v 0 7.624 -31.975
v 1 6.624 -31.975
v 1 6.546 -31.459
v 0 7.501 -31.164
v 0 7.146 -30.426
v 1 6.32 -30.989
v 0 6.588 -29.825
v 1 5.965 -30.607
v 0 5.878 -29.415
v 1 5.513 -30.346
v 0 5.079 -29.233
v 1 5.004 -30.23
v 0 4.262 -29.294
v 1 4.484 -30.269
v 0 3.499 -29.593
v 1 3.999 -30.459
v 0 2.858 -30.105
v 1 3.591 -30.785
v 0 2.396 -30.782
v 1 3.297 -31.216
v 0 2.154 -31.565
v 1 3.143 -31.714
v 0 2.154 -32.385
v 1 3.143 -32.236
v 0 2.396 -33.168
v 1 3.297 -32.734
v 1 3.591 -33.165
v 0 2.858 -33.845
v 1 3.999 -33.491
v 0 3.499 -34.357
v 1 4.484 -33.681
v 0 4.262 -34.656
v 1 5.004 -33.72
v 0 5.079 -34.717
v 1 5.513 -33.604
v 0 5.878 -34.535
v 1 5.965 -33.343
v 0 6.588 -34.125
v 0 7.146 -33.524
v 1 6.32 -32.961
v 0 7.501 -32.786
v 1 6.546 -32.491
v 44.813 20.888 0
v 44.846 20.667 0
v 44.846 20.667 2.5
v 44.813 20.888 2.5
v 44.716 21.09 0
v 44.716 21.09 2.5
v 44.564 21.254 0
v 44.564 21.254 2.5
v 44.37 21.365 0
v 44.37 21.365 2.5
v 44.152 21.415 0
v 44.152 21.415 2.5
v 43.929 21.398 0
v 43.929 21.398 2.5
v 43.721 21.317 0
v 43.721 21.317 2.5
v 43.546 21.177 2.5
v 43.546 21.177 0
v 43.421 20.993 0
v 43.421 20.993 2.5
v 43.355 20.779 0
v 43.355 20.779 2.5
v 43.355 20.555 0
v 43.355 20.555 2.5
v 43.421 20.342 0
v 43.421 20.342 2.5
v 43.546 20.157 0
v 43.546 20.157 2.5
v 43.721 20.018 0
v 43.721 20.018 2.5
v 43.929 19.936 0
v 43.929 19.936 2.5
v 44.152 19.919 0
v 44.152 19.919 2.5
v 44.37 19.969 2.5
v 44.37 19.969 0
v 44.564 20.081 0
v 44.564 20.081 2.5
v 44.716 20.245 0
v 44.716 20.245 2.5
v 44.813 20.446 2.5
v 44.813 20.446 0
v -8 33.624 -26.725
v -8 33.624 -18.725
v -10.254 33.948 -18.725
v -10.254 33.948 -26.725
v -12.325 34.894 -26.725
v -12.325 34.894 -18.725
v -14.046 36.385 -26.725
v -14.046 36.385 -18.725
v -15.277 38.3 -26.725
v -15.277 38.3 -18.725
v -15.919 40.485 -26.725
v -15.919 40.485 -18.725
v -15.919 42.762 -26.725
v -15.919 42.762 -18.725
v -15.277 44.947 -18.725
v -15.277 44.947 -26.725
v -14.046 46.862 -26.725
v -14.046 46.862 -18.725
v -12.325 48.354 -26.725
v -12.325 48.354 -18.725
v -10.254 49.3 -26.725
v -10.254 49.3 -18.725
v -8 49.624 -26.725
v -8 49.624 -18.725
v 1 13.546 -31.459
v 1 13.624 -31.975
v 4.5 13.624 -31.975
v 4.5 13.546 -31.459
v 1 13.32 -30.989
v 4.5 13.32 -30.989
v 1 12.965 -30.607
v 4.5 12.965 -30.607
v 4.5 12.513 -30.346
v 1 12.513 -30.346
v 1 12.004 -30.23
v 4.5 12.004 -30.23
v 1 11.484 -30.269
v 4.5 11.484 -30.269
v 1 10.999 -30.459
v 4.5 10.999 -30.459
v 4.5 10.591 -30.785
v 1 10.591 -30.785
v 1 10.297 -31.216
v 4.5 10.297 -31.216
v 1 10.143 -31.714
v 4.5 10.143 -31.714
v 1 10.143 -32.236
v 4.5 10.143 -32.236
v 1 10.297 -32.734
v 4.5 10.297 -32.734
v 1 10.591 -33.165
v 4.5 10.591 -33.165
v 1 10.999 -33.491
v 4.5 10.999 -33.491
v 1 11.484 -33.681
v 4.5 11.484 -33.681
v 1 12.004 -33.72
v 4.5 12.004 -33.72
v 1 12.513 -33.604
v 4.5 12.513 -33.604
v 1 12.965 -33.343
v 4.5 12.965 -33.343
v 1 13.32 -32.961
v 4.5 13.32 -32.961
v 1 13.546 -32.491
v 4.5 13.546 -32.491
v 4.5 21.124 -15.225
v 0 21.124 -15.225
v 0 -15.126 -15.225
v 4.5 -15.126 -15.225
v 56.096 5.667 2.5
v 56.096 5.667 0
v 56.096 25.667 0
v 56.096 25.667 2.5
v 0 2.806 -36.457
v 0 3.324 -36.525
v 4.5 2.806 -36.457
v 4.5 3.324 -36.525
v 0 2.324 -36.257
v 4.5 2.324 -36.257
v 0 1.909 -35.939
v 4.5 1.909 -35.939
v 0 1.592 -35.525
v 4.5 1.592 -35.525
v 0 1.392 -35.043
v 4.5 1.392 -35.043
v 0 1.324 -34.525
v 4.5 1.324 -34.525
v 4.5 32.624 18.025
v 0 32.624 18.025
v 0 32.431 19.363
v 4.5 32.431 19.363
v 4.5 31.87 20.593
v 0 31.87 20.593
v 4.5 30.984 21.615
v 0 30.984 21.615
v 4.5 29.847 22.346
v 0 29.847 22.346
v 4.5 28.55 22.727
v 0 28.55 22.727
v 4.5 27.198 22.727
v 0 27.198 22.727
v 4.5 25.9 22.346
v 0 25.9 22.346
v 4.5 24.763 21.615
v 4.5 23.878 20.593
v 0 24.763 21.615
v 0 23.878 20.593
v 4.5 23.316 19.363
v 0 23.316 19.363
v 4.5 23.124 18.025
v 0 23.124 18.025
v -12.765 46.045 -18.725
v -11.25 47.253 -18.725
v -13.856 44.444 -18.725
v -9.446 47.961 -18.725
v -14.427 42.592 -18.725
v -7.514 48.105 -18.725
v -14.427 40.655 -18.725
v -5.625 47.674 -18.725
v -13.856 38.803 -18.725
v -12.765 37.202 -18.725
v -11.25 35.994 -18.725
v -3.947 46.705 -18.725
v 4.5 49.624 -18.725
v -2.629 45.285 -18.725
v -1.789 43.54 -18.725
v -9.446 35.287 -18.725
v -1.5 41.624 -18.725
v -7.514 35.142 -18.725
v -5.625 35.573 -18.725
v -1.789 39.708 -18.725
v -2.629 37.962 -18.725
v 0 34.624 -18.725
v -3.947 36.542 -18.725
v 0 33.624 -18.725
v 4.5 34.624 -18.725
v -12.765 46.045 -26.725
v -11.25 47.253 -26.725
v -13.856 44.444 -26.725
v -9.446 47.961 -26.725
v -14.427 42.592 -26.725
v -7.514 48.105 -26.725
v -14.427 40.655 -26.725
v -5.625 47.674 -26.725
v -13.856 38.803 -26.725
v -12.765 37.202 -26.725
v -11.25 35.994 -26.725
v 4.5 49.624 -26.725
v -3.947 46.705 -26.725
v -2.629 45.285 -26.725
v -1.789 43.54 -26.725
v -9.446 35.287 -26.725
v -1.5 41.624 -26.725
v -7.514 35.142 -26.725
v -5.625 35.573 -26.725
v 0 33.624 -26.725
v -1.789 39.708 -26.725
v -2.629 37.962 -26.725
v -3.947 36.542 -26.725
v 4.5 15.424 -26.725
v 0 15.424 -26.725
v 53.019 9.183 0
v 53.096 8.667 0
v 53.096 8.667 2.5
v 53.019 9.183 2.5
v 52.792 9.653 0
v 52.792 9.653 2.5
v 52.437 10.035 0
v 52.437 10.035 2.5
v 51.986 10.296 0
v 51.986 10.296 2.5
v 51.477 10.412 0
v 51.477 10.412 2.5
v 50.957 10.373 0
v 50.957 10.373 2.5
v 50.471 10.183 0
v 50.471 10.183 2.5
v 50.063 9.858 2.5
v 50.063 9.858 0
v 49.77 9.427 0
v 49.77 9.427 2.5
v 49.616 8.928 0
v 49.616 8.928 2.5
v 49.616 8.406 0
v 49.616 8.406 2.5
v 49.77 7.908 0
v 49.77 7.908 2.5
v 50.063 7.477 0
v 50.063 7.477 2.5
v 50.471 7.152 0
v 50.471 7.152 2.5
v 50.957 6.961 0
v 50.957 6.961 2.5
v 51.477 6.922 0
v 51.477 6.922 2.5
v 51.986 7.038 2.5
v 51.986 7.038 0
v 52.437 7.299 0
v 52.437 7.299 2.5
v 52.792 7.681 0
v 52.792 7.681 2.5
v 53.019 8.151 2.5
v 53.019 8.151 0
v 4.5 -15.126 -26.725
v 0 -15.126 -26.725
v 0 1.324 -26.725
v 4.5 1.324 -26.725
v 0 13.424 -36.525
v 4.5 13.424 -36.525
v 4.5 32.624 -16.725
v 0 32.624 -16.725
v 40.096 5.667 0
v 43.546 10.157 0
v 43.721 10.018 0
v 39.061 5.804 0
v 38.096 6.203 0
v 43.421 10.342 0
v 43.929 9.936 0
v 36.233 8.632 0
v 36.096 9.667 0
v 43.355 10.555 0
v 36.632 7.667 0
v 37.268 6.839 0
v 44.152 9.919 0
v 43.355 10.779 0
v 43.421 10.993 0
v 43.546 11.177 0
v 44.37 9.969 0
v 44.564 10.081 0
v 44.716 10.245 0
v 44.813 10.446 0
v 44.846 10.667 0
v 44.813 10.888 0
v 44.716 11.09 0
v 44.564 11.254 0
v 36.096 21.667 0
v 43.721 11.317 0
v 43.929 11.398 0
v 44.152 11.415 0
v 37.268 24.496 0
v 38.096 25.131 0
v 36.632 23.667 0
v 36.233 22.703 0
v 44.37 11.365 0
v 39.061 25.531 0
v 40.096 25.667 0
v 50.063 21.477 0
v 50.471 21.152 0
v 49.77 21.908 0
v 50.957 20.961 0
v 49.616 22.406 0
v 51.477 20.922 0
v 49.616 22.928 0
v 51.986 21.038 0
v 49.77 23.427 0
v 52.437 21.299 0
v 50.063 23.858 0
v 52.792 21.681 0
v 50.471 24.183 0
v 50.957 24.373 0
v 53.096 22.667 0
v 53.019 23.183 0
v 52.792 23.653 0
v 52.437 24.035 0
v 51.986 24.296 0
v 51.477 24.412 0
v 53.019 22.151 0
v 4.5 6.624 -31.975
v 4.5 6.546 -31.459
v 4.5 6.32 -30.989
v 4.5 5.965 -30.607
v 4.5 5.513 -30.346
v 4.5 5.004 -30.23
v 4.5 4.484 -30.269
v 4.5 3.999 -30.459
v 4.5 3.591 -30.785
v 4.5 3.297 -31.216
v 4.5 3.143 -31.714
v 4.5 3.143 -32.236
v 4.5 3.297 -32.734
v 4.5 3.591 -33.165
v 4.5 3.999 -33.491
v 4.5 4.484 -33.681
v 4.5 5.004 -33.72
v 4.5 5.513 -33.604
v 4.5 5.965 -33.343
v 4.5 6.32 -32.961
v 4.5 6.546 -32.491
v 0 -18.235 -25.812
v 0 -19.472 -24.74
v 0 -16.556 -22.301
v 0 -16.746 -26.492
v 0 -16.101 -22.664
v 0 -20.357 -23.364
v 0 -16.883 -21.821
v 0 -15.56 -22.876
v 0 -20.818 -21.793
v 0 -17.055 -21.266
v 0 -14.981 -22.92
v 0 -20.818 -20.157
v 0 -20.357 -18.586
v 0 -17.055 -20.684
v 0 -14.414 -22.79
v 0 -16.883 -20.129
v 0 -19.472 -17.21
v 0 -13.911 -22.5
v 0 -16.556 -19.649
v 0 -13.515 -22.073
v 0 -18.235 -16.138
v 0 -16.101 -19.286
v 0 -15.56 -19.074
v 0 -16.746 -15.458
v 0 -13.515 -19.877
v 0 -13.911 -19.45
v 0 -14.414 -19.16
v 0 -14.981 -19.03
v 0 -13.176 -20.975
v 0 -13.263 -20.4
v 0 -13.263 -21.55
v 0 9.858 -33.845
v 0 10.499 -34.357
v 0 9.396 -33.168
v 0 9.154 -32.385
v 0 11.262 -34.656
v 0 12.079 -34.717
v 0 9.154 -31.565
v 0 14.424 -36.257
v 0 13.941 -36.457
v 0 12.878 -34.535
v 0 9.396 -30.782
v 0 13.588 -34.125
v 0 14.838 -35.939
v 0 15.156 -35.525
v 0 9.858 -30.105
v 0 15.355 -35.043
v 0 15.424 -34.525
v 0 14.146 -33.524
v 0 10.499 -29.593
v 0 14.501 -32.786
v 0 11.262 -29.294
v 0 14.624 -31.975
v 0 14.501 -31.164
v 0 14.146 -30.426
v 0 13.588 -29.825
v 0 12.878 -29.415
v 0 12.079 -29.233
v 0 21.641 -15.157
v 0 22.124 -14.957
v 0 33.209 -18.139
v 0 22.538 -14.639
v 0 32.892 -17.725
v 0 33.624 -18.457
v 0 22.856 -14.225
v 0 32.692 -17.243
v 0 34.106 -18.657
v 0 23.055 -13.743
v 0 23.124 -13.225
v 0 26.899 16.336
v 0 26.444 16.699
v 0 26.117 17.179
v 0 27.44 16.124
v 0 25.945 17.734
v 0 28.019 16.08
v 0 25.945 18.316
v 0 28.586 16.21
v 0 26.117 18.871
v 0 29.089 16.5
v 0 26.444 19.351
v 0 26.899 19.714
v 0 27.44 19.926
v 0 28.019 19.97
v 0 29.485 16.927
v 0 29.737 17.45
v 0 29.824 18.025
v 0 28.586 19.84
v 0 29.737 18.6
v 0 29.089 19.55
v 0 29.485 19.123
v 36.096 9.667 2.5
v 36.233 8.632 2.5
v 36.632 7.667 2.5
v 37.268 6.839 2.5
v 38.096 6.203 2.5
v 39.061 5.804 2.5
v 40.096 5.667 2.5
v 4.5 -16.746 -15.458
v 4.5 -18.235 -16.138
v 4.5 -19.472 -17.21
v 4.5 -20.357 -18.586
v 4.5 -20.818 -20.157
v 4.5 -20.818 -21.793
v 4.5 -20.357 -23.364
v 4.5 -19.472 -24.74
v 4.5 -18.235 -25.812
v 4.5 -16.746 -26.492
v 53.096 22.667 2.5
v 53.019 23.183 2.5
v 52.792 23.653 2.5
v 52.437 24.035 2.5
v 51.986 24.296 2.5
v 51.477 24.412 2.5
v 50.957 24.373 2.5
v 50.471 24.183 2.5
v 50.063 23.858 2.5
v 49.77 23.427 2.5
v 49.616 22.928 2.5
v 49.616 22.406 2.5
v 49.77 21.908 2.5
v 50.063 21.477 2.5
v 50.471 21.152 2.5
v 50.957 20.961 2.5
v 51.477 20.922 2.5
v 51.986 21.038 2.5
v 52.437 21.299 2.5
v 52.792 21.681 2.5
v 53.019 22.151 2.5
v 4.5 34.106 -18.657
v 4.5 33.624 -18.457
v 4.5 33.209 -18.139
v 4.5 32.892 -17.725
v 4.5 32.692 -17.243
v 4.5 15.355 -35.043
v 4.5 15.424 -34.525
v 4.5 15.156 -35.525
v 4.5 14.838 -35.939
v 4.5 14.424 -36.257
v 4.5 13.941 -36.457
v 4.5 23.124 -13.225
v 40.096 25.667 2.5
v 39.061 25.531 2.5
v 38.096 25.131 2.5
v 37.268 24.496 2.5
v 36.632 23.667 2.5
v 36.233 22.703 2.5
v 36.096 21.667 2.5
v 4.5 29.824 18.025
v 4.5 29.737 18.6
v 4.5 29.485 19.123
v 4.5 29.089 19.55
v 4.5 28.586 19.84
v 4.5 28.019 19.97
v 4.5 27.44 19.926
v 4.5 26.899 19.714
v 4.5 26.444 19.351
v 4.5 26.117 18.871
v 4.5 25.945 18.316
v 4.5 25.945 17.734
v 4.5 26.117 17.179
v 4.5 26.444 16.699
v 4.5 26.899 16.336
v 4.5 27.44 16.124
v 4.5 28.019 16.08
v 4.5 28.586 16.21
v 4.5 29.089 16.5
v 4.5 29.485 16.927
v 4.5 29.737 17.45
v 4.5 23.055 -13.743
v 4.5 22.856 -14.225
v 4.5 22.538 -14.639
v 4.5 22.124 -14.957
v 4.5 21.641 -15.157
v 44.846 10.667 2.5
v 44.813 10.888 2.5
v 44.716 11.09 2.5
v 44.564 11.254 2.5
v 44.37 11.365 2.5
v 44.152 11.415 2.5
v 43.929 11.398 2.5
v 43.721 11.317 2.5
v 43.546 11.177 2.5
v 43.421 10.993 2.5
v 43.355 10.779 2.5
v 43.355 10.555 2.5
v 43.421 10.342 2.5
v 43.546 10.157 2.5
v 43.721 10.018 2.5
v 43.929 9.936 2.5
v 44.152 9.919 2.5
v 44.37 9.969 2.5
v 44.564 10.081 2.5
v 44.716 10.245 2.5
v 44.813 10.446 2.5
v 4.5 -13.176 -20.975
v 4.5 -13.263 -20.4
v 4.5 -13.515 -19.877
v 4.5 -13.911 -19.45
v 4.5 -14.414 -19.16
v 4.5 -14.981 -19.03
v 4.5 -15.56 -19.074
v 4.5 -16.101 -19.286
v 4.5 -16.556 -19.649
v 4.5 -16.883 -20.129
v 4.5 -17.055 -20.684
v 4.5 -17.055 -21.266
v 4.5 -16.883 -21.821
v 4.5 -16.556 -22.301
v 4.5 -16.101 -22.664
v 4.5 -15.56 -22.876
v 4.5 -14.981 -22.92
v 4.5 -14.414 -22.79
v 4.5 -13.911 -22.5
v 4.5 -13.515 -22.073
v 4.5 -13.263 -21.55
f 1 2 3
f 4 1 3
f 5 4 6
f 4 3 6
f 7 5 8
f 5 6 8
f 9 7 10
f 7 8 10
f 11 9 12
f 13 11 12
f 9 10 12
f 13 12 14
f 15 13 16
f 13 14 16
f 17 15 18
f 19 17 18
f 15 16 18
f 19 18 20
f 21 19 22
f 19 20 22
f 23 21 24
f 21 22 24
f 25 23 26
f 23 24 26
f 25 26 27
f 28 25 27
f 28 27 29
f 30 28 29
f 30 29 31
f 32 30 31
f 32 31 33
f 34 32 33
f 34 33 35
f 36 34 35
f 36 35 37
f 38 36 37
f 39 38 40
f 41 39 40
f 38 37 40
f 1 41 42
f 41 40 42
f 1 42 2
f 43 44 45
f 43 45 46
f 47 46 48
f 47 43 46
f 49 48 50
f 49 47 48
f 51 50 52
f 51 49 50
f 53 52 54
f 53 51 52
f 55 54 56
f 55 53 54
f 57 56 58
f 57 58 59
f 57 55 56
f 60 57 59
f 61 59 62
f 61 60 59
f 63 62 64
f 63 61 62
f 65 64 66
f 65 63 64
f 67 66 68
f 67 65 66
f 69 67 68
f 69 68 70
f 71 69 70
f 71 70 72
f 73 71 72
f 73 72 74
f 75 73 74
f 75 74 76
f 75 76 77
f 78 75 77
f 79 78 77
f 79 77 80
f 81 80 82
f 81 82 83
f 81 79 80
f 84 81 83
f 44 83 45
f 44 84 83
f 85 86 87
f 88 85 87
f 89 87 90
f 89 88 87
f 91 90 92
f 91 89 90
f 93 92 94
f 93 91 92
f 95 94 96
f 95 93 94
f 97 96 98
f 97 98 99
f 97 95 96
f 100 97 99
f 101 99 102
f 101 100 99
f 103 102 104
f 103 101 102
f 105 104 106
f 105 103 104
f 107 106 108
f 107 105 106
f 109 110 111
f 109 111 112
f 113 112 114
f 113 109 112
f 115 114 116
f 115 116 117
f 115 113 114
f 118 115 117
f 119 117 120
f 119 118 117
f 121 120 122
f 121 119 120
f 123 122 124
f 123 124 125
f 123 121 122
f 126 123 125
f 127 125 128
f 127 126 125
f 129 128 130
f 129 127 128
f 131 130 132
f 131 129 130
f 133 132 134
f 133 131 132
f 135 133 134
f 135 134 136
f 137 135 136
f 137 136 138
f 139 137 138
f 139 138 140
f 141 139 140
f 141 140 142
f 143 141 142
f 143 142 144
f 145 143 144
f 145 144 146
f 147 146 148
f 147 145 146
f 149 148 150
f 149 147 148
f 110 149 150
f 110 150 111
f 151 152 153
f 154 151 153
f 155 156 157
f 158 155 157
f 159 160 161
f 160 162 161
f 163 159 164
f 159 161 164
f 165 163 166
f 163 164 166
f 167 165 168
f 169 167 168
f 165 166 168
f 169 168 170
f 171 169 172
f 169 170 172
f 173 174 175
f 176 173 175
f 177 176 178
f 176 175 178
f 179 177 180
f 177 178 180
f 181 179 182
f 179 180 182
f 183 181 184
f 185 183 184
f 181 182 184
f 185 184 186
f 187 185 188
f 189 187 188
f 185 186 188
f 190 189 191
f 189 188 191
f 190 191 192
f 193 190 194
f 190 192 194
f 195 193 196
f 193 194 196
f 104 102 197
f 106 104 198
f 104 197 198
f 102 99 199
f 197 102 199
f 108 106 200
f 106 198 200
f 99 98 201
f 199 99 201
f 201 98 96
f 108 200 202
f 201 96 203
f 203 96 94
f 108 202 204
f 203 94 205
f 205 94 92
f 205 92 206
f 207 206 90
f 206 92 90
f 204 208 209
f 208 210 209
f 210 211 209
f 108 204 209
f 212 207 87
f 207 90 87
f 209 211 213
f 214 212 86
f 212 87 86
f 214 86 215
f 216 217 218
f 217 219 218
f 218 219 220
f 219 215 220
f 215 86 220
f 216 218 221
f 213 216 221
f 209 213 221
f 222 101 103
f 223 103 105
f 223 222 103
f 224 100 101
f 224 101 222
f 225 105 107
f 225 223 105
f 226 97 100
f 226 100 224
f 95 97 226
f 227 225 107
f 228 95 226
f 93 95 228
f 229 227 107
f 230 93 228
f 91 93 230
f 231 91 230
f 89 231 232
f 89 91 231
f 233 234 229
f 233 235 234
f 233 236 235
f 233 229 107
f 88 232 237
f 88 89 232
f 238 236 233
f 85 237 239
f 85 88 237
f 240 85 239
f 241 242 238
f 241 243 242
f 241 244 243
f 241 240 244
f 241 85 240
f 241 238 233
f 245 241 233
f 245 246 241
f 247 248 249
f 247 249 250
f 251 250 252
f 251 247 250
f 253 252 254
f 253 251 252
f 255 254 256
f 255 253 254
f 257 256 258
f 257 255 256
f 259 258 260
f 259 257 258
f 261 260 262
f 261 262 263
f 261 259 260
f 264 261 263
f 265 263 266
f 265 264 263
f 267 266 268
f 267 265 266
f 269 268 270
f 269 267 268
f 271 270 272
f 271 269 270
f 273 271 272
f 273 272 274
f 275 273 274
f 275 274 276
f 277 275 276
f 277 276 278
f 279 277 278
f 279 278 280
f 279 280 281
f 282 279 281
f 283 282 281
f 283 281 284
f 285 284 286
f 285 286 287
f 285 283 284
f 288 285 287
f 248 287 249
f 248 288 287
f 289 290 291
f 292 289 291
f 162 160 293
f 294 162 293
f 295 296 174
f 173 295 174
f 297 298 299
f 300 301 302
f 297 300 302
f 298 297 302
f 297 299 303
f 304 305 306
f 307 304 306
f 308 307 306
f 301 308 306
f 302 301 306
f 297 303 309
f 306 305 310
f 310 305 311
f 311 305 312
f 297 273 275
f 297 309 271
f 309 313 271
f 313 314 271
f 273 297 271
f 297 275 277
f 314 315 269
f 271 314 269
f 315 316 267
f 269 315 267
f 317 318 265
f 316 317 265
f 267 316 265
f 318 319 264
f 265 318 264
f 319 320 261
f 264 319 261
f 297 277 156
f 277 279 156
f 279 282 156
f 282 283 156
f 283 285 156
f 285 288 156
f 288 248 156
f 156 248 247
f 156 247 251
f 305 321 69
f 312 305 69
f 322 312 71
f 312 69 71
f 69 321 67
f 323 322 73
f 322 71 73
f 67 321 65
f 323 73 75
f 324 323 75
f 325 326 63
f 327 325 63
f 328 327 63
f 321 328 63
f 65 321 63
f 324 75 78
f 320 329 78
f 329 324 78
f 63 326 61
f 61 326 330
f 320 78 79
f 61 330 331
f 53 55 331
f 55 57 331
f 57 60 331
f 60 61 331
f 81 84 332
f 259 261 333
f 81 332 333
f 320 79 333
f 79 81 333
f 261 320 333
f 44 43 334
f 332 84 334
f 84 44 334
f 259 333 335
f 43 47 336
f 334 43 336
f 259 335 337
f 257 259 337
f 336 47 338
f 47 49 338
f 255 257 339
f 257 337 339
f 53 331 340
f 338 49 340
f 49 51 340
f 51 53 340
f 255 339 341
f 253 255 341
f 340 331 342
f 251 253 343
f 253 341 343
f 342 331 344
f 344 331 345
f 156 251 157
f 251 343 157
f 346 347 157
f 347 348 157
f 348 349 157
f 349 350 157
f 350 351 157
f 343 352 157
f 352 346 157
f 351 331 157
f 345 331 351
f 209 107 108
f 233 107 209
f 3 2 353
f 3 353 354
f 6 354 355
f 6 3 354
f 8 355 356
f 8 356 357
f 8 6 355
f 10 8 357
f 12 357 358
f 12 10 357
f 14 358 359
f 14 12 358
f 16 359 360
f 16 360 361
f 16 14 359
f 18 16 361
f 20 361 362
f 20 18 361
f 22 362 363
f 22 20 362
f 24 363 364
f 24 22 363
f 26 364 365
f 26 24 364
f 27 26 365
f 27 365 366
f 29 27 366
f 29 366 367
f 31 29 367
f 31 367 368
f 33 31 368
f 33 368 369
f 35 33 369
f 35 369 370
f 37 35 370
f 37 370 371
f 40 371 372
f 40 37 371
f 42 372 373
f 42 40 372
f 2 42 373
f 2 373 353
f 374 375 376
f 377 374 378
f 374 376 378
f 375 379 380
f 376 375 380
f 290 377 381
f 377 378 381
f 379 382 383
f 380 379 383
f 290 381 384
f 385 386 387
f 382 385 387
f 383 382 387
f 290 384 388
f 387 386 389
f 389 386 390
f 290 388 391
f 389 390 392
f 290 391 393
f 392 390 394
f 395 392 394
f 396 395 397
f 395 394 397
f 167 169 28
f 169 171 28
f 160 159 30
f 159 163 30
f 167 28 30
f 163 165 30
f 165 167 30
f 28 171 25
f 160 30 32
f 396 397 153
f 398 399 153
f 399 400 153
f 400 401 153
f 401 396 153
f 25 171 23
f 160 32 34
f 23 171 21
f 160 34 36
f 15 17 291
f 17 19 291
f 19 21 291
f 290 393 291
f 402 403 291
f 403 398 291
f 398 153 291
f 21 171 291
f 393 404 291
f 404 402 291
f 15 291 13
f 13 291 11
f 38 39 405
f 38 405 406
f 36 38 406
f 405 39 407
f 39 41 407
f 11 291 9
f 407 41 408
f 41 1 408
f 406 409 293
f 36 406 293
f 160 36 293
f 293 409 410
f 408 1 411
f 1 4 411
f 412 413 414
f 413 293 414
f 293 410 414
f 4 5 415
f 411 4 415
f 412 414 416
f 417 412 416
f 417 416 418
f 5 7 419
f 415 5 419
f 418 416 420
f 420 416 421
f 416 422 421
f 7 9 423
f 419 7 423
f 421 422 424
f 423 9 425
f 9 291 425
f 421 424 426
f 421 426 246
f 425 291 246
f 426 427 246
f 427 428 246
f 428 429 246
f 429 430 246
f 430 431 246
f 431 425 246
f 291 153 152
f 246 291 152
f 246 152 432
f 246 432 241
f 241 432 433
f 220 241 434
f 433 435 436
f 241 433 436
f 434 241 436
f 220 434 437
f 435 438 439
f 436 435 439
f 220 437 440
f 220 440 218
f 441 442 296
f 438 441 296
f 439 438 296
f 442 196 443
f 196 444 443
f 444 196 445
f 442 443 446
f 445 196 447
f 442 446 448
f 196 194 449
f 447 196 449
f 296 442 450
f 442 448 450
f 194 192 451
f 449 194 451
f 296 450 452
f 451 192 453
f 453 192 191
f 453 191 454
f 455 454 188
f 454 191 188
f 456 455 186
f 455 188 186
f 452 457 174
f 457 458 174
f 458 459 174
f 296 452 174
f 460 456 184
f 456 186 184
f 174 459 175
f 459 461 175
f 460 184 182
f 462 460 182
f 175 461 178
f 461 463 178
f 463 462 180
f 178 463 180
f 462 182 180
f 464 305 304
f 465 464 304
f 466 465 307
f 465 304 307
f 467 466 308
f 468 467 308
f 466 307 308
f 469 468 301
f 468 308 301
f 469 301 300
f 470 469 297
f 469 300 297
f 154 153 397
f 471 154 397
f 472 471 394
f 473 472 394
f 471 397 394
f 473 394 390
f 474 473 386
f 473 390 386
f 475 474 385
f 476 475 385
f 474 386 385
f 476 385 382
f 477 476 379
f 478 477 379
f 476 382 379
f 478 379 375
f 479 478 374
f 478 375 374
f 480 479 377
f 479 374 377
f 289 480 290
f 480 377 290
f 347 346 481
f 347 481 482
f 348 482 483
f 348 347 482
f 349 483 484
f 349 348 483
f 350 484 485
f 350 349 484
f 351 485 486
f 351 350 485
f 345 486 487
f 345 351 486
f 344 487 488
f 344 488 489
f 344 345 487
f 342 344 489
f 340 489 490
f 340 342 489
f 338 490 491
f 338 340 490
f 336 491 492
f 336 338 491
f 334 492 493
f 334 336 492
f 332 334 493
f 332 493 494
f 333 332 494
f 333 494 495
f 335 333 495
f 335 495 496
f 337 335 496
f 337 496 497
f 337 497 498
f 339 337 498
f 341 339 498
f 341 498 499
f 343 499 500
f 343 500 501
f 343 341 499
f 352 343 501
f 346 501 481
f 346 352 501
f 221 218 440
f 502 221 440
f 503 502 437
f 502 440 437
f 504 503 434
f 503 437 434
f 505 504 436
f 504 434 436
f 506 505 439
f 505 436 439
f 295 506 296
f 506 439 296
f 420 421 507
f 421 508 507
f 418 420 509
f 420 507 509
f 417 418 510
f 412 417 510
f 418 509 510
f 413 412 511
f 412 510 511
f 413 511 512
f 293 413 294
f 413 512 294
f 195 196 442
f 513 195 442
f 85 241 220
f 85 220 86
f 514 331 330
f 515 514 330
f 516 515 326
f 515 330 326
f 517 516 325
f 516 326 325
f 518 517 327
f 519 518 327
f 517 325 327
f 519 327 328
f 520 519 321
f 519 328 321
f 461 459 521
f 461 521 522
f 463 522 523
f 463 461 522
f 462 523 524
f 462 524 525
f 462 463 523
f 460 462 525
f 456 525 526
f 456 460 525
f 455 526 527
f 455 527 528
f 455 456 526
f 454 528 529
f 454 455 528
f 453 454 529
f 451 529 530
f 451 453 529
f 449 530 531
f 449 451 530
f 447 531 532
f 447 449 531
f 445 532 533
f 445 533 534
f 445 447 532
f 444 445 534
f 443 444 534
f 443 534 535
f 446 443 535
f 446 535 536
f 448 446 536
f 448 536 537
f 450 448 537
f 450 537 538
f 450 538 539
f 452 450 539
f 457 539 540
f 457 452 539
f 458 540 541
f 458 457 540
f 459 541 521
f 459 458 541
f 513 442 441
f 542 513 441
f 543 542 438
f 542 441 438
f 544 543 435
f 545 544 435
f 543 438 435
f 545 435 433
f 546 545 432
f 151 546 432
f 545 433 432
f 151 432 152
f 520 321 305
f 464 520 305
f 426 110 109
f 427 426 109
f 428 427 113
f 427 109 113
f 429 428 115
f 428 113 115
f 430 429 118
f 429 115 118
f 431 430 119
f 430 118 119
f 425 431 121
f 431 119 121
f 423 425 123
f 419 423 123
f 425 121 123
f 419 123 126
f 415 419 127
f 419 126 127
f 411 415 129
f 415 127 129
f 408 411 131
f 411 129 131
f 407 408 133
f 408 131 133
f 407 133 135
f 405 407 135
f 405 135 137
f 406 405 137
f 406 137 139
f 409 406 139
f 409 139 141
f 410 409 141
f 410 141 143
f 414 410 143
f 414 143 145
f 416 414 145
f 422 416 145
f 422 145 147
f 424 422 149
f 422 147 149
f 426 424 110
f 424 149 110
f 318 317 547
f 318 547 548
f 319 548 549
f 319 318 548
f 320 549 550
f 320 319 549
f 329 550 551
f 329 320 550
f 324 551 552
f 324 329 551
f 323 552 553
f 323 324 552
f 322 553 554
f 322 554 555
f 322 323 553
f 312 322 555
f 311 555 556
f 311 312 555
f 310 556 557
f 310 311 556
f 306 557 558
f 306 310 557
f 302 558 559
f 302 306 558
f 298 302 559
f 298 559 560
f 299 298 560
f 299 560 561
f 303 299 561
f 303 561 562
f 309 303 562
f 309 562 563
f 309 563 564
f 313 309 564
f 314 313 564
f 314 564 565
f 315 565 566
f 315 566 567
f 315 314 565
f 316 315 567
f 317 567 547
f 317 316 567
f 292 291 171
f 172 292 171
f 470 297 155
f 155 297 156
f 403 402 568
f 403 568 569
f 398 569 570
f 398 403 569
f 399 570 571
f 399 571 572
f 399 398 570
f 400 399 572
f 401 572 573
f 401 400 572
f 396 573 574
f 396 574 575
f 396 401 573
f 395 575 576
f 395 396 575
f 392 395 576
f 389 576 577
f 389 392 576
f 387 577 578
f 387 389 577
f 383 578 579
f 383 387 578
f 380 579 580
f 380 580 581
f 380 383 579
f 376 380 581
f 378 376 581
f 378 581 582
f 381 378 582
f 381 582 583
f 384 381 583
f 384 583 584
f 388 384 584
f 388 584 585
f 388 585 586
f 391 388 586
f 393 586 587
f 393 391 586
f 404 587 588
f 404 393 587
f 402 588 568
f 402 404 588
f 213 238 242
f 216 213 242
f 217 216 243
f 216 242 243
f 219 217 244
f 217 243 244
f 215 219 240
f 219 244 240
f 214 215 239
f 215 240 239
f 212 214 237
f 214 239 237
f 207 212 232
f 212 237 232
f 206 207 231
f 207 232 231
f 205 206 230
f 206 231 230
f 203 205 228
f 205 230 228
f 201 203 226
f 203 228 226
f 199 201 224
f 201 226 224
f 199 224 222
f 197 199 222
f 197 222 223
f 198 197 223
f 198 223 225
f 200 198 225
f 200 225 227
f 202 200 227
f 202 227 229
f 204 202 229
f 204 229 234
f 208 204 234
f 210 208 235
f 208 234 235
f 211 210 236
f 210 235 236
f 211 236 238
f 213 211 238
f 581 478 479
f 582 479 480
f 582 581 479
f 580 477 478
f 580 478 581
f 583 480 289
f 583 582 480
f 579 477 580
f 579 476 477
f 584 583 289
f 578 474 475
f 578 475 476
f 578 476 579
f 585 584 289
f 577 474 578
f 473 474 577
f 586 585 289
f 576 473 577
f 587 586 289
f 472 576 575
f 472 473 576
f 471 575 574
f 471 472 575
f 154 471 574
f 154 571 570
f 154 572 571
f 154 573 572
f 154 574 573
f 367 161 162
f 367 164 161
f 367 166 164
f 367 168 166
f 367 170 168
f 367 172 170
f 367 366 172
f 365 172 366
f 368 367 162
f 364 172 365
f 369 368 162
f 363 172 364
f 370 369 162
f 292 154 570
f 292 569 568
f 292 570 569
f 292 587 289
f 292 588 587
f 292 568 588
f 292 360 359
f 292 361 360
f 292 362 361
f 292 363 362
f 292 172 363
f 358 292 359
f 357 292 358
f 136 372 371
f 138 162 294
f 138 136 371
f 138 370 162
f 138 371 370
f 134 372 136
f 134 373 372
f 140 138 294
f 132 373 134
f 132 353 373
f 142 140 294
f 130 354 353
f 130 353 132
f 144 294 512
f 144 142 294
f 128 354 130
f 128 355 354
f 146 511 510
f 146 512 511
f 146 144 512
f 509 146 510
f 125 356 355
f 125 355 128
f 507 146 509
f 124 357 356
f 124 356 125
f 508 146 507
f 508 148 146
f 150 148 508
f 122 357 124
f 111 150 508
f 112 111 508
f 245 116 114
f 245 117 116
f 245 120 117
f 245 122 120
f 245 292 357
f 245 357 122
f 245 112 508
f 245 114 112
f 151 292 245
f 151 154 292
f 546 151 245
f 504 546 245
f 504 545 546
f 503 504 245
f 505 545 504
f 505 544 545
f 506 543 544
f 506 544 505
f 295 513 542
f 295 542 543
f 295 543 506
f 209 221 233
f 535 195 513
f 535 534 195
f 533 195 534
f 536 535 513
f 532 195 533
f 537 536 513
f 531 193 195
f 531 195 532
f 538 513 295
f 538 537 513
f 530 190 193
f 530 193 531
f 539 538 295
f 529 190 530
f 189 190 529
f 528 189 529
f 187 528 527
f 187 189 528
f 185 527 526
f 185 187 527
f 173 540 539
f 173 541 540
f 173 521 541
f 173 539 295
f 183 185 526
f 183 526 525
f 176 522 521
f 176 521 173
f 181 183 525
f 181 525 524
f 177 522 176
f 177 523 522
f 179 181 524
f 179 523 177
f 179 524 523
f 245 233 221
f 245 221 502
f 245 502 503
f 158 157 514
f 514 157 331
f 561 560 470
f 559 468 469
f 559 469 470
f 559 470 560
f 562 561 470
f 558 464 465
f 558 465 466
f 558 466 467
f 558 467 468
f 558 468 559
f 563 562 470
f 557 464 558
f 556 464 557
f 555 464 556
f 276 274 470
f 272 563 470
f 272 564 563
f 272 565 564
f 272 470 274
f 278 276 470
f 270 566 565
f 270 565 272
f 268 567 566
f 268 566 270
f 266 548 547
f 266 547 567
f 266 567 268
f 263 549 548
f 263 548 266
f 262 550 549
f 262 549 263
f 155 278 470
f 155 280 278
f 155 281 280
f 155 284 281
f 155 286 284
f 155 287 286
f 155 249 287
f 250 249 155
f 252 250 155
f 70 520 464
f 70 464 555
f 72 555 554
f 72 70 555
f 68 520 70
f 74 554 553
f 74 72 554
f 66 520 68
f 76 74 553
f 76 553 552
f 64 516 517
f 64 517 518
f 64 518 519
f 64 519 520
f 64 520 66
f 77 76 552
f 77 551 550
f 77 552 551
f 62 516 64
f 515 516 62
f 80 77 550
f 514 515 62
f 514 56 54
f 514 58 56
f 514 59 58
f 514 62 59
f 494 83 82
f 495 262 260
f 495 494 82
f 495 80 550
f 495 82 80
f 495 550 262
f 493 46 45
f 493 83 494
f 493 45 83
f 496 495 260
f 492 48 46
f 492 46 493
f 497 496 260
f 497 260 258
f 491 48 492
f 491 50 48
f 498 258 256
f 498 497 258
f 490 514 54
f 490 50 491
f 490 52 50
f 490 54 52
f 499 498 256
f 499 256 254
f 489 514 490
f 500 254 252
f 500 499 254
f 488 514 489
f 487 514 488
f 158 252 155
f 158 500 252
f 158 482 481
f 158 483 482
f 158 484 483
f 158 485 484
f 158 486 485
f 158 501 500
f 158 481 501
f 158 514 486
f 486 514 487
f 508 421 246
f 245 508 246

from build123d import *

# Parameters (mm, degrees)
F3_R     = 1.75
F3_R_2   = 1.95
F3_W     = 13
F3_H     = 8
F4_DEPTH = 4.5
F2_R     = 6.5
F5_DEPTH = 8
F6_SIZE  = 1
F7_R     = 2
F8_R     = 0.75
F8_R_2   = 1.75
F9_DEPTH = 2.5


with BuildPart() as f4:
    # F3 (on Right) → F4 (new body)
    with BuildSketch(Plane.YZ):
        with BuildLine():
            Line((36.6235950301, -26.7250053585), (36.6235950301, -18.7250053585))
            Line((36.6235950301, -18.7250053585), (34.6235950301, -18.7250053585))
            ThreePointArc((34.6235950301, -18.7250053585), (33.2093814677, -18.1392189208), (32.6235950301, -16.7250053585))
            Line((32.6235950301, -16.7250053585), (32.6235950301, 18.0249946415))
            ThreePointArc((32.6235950301, 18.0249946415), (27.8735950301, 22.7749946415), (23.1235950301, 18.0249946415))
            Line((23.1235950301, 18.0249946415), (23.1235950301, -13.2250053585))
            ThreePointArc((23.1235950301, -13.2250053585), (22.5378085924, -14.6392189208), (21.1235950301, -15.2250053585))
            Line((21.1235950301, -15.2250053585), (-15.1264049699, -15.2250053585))
            ThreePointArc((-15.1264049699, -15.2250053585), (-20.8764049699, -20.9750053585), (-15.1264049699, -26.7250053585))
            Line((-15.1264049699, -26.7250053585), (1.3235950301, -26.7250053585))
            Line((1.3235950301, -26.7250053585), (1.3235950301, -36.5250053585))
            Line((1.3235950301, -36.5250053585), (15.4235950301, -36.5250053585))
            Line((15.4235950301, -36.5250053585), (15.4235950301, -26.7250053585))
            Line((15.4235950301, -26.7250053585), (36.6235950301, -26.7250053585))
        make_face()
        with Locations((4.8735950301, -31.9750053585)):
            Circle(F3_R, mode=Mode.SUBTRACT)
        with Locations((11.8735950301, -31.9750053585)):
            Circle(F3_R, mode=Mode.SUBTRACT)
        with Locations((-15.1264049699, -20.9750053585)):
            Circle(F3_R_2, mode=Mode.SUBTRACT)
        with Locations((27.8735950301, 18.0249946415)):
            Circle(F3_R_2, mode=Mode.SUBTRACT)
        with Locations((43.1235950301, -22.7250053585)):
            Rectangle(F3_W, F3_H)
    extrude(amount=F4_DEPTH)

    # F2 (on line) → F5 (join, through all)
    with BuildSketch(Plane(origin=(0, 0, -26.7250053585), x_dir=(1, 0, 0), z_dir=(0, 0, -1))):
        with BuildLine():
            ThreePointArc((-8, -33.6235950301), (-16, -41.6235950301), (-8, -49.6235950301))
            ThreePointArc((-8, -49.6235950301), (-2.3431457505, -47.2804492795), (0, -41.6235950301))
            ThreePointArc((0, -41.6235950301), (-2.3431457505, -35.9667407806), (-8, -33.6235950301))
        make_face()
        with Locations((-8, -41.6235950301)):
            Circle(F2_R, mode=Mode.SUBTRACT)
        with BuildLine():
            ThreePointArc((0, -41.6235950301), (-2.3431457505, -47.2804492795), (-8, -49.6235950301))
            Line((-8, -49.6235950301), (0, -49.6235950301))
            Line((0, -49.6235950301), (0, -41.6235950301))
        make_face()
        with BuildLine():
            Line((0, -33.6235950301), (-8, -33.6235950301))
            ThreePointArc((-8, -33.6235950301), (-2.3431457505, -35.9667407806), (0, -41.6235950301))
            Line((0, -41.6235950301), (0, -33.6235950301))
        make_face()
    extrude(amount=-F5_DEPTH)

    # F6
    f6_edges = [f4.edges().sort_by_distance(p)[0] for p in [
        (0, 3.123595, -31.975005),
        (0, 10.123595, -31.975005),
    ]]
    chamfer(f6_edges, length=F6_SIZE)

    # F7
    f7_edges = [f4.edges().sort_by_distance(p)[0] for p in [
        (2.25, 15.423595, -36.525005),
        (2.25, 1.323595, -36.525005),
    ]]
    fillet(f7_edges, radius=F7_R)


with BuildPart() as f9:
    # F8 (on Top) → F9 (new body)
    with BuildSketch(Plane.XY):
        with BuildLine():
            Line((56.096283406, 5.6672617793), (56.096283406, 25.6672617793))
            Line((56.096283406, 25.6672617793), (40.096283406, 25.6672617793))
            ThreePointArc((40.096283406, 25.6672617793), (37.2678562813, 24.4956889041), (36.096283406, 21.6672617793))
            Line((36.096283406, 21.6672617793), (36.096283406, 9.6672617793))
            ThreePointArc((36.096283406, 9.6672617793), (37.2678562813, 6.8388346546), (40.096283406, 5.6672617793))
            Line((40.096283406, 5.6672617793), (56.096283406, 5.6672617793))
        make_face()
        with Locations((44.096283406, 10.6672617793)):
            Circle(F8_R, mode=Mode.SUBTRACT)
        with Locations((51.346283406, 8.6672617793)):
            Circle(F8_R_2, mode=Mode.SUBTRACT)
        with Locations((44.096283406, 20.6672617793)):
            Circle(F8_R, mode=Mode.SUBTRACT)
        with Locations((51.346283406, 22.6672617793)):
            Circle(F8_R_2, mode=Mode.SUBTRACT)
    extrude(amount=F9_DEPTH)


solid = Compound([f4.part, f9.part])
